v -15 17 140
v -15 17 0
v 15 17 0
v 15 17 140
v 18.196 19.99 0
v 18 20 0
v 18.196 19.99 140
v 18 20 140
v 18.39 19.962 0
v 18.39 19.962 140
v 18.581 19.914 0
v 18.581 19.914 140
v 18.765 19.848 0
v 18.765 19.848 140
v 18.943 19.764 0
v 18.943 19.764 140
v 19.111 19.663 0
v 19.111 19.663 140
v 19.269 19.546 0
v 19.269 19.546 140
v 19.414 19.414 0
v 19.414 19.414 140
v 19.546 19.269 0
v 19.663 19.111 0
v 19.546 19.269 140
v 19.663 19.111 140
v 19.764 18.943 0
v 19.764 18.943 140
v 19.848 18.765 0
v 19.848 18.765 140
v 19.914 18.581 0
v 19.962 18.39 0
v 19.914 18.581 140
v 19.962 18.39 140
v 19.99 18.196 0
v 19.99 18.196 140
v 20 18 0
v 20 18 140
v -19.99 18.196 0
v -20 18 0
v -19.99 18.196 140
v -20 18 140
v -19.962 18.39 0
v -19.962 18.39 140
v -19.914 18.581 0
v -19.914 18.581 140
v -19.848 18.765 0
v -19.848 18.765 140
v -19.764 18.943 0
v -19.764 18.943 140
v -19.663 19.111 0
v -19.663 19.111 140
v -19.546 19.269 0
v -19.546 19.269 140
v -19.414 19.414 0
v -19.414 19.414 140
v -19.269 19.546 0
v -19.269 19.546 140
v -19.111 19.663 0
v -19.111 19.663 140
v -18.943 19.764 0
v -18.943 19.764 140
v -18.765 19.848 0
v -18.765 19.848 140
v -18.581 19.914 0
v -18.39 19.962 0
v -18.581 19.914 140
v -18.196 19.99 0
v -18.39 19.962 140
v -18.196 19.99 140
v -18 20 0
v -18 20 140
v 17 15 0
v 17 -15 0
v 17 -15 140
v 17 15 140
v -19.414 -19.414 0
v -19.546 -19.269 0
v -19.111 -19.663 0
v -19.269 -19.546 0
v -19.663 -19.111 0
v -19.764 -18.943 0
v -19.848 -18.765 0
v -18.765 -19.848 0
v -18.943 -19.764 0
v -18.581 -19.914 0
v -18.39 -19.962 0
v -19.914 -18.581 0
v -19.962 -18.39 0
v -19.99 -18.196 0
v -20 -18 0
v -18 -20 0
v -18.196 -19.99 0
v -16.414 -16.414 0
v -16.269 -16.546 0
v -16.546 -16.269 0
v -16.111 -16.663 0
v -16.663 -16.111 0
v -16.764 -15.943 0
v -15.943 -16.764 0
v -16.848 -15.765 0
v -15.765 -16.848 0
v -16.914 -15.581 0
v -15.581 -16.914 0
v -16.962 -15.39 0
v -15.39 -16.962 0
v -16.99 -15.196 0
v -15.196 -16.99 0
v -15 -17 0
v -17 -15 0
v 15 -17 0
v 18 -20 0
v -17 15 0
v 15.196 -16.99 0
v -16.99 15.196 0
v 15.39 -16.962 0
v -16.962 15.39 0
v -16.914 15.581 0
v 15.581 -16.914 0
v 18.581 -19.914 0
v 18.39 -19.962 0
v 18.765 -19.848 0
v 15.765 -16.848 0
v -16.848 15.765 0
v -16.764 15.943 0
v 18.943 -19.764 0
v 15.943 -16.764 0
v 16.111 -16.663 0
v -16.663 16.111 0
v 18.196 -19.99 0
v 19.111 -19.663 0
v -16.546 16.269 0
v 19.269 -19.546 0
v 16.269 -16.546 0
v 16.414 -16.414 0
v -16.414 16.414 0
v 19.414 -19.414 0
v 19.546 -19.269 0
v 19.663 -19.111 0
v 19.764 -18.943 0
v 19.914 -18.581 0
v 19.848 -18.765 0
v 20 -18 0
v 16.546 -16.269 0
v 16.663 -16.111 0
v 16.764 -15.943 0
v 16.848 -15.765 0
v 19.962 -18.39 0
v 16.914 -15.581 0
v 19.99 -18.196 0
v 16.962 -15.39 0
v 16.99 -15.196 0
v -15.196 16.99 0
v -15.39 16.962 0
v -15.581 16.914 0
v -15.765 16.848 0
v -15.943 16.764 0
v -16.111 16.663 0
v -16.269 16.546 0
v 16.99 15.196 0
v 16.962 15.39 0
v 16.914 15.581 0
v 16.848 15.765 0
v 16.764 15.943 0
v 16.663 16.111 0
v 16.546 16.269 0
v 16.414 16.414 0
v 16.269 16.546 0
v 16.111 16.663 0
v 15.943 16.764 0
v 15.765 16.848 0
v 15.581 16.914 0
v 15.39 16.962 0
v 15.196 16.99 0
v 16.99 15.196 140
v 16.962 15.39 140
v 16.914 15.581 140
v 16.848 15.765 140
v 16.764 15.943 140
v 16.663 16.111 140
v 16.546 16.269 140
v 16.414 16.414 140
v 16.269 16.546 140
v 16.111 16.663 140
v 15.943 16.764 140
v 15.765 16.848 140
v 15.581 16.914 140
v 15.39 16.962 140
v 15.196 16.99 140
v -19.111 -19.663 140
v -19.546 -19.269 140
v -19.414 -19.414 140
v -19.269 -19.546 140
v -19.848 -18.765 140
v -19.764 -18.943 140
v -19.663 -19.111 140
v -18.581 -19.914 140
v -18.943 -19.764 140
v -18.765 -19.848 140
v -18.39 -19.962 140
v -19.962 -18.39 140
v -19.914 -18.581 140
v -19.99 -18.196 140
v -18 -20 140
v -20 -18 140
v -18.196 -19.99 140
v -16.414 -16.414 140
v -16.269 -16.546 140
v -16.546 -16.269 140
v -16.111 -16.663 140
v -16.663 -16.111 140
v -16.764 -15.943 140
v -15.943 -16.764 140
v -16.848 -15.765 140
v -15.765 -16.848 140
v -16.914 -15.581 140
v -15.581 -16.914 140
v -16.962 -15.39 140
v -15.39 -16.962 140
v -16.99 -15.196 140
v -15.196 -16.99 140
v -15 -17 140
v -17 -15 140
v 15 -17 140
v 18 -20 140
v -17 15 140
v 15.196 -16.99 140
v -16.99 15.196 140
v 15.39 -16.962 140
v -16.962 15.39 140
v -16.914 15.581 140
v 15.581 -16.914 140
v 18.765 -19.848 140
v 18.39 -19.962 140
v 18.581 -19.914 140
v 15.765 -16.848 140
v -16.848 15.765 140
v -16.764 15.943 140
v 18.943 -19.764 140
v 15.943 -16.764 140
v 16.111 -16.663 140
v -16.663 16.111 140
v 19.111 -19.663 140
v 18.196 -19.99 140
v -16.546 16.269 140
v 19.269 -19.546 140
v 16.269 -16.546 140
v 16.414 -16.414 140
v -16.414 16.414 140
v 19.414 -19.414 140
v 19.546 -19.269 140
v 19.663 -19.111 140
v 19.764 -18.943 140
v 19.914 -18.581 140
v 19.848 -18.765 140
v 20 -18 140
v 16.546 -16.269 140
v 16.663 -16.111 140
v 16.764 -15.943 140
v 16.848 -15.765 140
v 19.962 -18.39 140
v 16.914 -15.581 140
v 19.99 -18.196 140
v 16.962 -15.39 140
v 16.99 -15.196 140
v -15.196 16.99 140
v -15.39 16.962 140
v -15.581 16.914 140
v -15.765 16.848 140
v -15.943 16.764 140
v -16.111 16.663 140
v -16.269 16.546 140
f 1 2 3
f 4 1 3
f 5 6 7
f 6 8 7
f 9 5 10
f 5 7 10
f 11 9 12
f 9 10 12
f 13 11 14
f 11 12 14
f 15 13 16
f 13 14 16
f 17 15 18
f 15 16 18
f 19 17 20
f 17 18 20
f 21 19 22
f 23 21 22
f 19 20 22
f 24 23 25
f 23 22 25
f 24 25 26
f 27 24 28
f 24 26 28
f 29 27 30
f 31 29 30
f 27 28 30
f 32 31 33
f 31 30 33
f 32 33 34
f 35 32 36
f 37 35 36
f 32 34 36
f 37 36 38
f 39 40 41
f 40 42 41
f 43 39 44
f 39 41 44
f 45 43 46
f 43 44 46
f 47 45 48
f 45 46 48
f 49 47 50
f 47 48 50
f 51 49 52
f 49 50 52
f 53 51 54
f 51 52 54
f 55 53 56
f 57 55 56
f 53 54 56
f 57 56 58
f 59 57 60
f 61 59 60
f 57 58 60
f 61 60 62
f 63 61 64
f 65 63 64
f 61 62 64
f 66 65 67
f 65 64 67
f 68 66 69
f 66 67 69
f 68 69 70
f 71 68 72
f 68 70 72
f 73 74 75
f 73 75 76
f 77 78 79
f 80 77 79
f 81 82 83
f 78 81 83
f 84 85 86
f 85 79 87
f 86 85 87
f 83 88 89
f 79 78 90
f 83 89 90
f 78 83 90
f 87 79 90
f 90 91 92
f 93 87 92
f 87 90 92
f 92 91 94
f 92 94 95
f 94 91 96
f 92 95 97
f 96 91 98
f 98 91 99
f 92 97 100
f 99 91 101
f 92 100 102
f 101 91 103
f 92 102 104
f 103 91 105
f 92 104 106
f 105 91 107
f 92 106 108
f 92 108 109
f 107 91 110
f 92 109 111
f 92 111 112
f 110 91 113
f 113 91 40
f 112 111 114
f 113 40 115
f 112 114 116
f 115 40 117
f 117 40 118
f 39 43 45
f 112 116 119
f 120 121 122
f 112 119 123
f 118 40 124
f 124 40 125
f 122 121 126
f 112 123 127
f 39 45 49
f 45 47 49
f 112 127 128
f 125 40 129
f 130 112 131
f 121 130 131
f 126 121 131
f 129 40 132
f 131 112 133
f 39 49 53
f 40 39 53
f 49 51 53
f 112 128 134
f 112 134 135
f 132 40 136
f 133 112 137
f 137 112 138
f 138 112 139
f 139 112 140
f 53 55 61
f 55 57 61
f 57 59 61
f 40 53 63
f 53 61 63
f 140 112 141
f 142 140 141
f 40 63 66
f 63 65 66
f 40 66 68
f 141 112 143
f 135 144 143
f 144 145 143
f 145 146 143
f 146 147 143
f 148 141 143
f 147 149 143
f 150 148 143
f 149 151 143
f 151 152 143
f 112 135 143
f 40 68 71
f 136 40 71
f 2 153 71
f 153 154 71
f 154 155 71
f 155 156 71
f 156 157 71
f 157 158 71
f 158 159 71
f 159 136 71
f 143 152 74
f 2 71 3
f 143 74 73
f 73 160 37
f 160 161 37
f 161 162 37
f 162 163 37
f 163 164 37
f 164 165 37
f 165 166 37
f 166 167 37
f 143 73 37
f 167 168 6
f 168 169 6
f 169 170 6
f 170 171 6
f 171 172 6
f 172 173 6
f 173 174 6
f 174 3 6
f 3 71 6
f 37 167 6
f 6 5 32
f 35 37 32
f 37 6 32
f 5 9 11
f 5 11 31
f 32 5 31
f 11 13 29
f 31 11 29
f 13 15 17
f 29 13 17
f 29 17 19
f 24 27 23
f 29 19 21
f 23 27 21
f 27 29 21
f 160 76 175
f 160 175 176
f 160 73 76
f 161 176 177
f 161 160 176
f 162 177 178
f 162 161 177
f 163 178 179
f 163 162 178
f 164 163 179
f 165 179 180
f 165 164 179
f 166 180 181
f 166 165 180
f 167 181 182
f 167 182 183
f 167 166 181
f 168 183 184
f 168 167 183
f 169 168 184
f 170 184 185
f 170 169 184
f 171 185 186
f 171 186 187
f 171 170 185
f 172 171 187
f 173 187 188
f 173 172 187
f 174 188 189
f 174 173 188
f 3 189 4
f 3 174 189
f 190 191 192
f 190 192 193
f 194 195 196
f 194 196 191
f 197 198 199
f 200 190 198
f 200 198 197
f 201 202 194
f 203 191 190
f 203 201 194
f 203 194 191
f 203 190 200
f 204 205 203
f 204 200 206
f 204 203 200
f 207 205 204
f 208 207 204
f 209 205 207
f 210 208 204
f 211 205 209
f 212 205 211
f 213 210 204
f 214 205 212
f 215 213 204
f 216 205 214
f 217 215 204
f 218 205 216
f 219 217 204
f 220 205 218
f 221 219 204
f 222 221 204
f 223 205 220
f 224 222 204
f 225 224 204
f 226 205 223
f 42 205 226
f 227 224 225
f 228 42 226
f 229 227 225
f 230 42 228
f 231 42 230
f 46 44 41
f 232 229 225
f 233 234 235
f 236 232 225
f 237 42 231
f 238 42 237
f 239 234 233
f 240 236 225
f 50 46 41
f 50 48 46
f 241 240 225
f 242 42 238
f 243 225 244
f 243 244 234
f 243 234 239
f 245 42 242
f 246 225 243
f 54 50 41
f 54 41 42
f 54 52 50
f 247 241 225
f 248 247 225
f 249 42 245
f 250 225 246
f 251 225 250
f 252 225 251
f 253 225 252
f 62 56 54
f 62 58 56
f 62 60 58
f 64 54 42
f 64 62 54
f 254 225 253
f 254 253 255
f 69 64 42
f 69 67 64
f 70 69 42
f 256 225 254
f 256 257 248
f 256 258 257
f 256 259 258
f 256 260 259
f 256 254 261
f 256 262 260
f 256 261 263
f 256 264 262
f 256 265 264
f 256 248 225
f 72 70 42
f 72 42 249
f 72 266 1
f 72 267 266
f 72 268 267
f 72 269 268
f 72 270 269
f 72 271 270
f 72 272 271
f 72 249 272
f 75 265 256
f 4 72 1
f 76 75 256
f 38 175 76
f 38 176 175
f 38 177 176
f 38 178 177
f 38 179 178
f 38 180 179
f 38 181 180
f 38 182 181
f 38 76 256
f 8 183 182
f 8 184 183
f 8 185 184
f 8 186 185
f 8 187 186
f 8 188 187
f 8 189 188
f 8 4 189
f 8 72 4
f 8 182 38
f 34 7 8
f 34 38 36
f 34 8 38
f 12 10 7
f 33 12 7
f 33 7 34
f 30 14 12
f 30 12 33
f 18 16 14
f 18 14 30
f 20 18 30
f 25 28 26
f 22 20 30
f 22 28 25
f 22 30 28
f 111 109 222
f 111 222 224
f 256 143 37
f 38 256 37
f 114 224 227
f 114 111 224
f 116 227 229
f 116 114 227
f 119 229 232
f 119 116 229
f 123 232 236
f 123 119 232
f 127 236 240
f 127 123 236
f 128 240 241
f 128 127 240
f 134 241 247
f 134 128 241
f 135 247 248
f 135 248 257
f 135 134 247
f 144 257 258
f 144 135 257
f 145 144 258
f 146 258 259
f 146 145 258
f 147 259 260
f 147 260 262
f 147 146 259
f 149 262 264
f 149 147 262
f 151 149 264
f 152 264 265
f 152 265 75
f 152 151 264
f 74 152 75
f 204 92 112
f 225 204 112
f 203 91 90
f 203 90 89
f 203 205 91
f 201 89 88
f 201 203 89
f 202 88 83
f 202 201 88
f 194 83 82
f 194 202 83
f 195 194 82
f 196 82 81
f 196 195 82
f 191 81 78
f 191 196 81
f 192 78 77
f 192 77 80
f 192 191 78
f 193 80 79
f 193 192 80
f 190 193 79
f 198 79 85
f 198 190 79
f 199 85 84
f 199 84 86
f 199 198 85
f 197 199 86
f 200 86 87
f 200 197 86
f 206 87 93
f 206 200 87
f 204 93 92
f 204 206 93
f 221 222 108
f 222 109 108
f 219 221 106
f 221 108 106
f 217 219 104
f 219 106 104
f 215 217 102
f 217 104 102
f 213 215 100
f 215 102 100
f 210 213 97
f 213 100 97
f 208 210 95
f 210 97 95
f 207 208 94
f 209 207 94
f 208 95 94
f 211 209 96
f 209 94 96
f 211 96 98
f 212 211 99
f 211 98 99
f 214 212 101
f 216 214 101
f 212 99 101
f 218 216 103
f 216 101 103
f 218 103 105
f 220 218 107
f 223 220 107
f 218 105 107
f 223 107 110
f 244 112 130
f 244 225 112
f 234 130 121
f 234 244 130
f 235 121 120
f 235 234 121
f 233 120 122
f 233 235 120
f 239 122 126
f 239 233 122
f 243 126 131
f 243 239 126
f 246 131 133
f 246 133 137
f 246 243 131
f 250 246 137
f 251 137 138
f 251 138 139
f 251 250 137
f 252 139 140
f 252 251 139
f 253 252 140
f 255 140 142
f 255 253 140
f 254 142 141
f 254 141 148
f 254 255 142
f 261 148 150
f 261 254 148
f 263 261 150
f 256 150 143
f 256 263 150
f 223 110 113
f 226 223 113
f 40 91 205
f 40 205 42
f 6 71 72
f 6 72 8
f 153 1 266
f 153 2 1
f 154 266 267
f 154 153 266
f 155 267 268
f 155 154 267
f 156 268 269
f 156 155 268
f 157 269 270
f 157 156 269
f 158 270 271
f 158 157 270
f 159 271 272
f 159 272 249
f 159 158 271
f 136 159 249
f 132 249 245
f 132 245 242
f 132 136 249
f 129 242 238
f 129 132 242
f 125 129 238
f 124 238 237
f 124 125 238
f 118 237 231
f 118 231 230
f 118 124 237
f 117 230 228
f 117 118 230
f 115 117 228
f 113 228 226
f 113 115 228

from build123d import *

# Parameters (mm, degrees)
SKETCH1_W           = 40
SKETCH1_H           = 40
BOSS_EXTRUDE1_DEPTH = 140
SKETCH2_W           = 34
SKETCH2_H           = 34
CUT_EXTRUDE1_DEPTH  = 143.828568571
FILLET1_R           = 2
FILLET2_R           = 2


with BuildPart() as part:
    # Sketch1 → Boss-Extrude1 (new body)
    with BuildSketch(Plane.XY):
        Rectangle(SKETCH1_W, SKETCH1_H)
    extrude(amount=BOSS_EXTRUDE1_DEPTH)

    # Sketch2 → Cut-Extrude1 (cut, through all)
    with BuildSketch(Plane.XY.offset(140)):
        Rectangle(SKETCH2_W, SKETCH2_H)
    extrude(amount=-CUT_EXTRUDE1_DEPTH, mode=Mode.SUBTRACT)

    # Fillet1
    fillet1_edges = [part.edges().sort_by_distance(p)[0] for p in [
        (20, -20, 70),
        (-20, -20, 70),
        (-20, 20, 70),
        (20, 20, 70),
    ]]
    fillet(fillet1_edges, radius=FILLET1_R)

    # Fillet2
    fillet2_edges = [part.edges().sort_by_distance(p)[0] for p in [
        (17, 17, 70),
        (17, -17, 70),
        (-17, -17, 70),
        (-17, 17, 70),
    ]]
    fillet(fillet2_edges, radius=FILLET2_R)


solid = part.part
